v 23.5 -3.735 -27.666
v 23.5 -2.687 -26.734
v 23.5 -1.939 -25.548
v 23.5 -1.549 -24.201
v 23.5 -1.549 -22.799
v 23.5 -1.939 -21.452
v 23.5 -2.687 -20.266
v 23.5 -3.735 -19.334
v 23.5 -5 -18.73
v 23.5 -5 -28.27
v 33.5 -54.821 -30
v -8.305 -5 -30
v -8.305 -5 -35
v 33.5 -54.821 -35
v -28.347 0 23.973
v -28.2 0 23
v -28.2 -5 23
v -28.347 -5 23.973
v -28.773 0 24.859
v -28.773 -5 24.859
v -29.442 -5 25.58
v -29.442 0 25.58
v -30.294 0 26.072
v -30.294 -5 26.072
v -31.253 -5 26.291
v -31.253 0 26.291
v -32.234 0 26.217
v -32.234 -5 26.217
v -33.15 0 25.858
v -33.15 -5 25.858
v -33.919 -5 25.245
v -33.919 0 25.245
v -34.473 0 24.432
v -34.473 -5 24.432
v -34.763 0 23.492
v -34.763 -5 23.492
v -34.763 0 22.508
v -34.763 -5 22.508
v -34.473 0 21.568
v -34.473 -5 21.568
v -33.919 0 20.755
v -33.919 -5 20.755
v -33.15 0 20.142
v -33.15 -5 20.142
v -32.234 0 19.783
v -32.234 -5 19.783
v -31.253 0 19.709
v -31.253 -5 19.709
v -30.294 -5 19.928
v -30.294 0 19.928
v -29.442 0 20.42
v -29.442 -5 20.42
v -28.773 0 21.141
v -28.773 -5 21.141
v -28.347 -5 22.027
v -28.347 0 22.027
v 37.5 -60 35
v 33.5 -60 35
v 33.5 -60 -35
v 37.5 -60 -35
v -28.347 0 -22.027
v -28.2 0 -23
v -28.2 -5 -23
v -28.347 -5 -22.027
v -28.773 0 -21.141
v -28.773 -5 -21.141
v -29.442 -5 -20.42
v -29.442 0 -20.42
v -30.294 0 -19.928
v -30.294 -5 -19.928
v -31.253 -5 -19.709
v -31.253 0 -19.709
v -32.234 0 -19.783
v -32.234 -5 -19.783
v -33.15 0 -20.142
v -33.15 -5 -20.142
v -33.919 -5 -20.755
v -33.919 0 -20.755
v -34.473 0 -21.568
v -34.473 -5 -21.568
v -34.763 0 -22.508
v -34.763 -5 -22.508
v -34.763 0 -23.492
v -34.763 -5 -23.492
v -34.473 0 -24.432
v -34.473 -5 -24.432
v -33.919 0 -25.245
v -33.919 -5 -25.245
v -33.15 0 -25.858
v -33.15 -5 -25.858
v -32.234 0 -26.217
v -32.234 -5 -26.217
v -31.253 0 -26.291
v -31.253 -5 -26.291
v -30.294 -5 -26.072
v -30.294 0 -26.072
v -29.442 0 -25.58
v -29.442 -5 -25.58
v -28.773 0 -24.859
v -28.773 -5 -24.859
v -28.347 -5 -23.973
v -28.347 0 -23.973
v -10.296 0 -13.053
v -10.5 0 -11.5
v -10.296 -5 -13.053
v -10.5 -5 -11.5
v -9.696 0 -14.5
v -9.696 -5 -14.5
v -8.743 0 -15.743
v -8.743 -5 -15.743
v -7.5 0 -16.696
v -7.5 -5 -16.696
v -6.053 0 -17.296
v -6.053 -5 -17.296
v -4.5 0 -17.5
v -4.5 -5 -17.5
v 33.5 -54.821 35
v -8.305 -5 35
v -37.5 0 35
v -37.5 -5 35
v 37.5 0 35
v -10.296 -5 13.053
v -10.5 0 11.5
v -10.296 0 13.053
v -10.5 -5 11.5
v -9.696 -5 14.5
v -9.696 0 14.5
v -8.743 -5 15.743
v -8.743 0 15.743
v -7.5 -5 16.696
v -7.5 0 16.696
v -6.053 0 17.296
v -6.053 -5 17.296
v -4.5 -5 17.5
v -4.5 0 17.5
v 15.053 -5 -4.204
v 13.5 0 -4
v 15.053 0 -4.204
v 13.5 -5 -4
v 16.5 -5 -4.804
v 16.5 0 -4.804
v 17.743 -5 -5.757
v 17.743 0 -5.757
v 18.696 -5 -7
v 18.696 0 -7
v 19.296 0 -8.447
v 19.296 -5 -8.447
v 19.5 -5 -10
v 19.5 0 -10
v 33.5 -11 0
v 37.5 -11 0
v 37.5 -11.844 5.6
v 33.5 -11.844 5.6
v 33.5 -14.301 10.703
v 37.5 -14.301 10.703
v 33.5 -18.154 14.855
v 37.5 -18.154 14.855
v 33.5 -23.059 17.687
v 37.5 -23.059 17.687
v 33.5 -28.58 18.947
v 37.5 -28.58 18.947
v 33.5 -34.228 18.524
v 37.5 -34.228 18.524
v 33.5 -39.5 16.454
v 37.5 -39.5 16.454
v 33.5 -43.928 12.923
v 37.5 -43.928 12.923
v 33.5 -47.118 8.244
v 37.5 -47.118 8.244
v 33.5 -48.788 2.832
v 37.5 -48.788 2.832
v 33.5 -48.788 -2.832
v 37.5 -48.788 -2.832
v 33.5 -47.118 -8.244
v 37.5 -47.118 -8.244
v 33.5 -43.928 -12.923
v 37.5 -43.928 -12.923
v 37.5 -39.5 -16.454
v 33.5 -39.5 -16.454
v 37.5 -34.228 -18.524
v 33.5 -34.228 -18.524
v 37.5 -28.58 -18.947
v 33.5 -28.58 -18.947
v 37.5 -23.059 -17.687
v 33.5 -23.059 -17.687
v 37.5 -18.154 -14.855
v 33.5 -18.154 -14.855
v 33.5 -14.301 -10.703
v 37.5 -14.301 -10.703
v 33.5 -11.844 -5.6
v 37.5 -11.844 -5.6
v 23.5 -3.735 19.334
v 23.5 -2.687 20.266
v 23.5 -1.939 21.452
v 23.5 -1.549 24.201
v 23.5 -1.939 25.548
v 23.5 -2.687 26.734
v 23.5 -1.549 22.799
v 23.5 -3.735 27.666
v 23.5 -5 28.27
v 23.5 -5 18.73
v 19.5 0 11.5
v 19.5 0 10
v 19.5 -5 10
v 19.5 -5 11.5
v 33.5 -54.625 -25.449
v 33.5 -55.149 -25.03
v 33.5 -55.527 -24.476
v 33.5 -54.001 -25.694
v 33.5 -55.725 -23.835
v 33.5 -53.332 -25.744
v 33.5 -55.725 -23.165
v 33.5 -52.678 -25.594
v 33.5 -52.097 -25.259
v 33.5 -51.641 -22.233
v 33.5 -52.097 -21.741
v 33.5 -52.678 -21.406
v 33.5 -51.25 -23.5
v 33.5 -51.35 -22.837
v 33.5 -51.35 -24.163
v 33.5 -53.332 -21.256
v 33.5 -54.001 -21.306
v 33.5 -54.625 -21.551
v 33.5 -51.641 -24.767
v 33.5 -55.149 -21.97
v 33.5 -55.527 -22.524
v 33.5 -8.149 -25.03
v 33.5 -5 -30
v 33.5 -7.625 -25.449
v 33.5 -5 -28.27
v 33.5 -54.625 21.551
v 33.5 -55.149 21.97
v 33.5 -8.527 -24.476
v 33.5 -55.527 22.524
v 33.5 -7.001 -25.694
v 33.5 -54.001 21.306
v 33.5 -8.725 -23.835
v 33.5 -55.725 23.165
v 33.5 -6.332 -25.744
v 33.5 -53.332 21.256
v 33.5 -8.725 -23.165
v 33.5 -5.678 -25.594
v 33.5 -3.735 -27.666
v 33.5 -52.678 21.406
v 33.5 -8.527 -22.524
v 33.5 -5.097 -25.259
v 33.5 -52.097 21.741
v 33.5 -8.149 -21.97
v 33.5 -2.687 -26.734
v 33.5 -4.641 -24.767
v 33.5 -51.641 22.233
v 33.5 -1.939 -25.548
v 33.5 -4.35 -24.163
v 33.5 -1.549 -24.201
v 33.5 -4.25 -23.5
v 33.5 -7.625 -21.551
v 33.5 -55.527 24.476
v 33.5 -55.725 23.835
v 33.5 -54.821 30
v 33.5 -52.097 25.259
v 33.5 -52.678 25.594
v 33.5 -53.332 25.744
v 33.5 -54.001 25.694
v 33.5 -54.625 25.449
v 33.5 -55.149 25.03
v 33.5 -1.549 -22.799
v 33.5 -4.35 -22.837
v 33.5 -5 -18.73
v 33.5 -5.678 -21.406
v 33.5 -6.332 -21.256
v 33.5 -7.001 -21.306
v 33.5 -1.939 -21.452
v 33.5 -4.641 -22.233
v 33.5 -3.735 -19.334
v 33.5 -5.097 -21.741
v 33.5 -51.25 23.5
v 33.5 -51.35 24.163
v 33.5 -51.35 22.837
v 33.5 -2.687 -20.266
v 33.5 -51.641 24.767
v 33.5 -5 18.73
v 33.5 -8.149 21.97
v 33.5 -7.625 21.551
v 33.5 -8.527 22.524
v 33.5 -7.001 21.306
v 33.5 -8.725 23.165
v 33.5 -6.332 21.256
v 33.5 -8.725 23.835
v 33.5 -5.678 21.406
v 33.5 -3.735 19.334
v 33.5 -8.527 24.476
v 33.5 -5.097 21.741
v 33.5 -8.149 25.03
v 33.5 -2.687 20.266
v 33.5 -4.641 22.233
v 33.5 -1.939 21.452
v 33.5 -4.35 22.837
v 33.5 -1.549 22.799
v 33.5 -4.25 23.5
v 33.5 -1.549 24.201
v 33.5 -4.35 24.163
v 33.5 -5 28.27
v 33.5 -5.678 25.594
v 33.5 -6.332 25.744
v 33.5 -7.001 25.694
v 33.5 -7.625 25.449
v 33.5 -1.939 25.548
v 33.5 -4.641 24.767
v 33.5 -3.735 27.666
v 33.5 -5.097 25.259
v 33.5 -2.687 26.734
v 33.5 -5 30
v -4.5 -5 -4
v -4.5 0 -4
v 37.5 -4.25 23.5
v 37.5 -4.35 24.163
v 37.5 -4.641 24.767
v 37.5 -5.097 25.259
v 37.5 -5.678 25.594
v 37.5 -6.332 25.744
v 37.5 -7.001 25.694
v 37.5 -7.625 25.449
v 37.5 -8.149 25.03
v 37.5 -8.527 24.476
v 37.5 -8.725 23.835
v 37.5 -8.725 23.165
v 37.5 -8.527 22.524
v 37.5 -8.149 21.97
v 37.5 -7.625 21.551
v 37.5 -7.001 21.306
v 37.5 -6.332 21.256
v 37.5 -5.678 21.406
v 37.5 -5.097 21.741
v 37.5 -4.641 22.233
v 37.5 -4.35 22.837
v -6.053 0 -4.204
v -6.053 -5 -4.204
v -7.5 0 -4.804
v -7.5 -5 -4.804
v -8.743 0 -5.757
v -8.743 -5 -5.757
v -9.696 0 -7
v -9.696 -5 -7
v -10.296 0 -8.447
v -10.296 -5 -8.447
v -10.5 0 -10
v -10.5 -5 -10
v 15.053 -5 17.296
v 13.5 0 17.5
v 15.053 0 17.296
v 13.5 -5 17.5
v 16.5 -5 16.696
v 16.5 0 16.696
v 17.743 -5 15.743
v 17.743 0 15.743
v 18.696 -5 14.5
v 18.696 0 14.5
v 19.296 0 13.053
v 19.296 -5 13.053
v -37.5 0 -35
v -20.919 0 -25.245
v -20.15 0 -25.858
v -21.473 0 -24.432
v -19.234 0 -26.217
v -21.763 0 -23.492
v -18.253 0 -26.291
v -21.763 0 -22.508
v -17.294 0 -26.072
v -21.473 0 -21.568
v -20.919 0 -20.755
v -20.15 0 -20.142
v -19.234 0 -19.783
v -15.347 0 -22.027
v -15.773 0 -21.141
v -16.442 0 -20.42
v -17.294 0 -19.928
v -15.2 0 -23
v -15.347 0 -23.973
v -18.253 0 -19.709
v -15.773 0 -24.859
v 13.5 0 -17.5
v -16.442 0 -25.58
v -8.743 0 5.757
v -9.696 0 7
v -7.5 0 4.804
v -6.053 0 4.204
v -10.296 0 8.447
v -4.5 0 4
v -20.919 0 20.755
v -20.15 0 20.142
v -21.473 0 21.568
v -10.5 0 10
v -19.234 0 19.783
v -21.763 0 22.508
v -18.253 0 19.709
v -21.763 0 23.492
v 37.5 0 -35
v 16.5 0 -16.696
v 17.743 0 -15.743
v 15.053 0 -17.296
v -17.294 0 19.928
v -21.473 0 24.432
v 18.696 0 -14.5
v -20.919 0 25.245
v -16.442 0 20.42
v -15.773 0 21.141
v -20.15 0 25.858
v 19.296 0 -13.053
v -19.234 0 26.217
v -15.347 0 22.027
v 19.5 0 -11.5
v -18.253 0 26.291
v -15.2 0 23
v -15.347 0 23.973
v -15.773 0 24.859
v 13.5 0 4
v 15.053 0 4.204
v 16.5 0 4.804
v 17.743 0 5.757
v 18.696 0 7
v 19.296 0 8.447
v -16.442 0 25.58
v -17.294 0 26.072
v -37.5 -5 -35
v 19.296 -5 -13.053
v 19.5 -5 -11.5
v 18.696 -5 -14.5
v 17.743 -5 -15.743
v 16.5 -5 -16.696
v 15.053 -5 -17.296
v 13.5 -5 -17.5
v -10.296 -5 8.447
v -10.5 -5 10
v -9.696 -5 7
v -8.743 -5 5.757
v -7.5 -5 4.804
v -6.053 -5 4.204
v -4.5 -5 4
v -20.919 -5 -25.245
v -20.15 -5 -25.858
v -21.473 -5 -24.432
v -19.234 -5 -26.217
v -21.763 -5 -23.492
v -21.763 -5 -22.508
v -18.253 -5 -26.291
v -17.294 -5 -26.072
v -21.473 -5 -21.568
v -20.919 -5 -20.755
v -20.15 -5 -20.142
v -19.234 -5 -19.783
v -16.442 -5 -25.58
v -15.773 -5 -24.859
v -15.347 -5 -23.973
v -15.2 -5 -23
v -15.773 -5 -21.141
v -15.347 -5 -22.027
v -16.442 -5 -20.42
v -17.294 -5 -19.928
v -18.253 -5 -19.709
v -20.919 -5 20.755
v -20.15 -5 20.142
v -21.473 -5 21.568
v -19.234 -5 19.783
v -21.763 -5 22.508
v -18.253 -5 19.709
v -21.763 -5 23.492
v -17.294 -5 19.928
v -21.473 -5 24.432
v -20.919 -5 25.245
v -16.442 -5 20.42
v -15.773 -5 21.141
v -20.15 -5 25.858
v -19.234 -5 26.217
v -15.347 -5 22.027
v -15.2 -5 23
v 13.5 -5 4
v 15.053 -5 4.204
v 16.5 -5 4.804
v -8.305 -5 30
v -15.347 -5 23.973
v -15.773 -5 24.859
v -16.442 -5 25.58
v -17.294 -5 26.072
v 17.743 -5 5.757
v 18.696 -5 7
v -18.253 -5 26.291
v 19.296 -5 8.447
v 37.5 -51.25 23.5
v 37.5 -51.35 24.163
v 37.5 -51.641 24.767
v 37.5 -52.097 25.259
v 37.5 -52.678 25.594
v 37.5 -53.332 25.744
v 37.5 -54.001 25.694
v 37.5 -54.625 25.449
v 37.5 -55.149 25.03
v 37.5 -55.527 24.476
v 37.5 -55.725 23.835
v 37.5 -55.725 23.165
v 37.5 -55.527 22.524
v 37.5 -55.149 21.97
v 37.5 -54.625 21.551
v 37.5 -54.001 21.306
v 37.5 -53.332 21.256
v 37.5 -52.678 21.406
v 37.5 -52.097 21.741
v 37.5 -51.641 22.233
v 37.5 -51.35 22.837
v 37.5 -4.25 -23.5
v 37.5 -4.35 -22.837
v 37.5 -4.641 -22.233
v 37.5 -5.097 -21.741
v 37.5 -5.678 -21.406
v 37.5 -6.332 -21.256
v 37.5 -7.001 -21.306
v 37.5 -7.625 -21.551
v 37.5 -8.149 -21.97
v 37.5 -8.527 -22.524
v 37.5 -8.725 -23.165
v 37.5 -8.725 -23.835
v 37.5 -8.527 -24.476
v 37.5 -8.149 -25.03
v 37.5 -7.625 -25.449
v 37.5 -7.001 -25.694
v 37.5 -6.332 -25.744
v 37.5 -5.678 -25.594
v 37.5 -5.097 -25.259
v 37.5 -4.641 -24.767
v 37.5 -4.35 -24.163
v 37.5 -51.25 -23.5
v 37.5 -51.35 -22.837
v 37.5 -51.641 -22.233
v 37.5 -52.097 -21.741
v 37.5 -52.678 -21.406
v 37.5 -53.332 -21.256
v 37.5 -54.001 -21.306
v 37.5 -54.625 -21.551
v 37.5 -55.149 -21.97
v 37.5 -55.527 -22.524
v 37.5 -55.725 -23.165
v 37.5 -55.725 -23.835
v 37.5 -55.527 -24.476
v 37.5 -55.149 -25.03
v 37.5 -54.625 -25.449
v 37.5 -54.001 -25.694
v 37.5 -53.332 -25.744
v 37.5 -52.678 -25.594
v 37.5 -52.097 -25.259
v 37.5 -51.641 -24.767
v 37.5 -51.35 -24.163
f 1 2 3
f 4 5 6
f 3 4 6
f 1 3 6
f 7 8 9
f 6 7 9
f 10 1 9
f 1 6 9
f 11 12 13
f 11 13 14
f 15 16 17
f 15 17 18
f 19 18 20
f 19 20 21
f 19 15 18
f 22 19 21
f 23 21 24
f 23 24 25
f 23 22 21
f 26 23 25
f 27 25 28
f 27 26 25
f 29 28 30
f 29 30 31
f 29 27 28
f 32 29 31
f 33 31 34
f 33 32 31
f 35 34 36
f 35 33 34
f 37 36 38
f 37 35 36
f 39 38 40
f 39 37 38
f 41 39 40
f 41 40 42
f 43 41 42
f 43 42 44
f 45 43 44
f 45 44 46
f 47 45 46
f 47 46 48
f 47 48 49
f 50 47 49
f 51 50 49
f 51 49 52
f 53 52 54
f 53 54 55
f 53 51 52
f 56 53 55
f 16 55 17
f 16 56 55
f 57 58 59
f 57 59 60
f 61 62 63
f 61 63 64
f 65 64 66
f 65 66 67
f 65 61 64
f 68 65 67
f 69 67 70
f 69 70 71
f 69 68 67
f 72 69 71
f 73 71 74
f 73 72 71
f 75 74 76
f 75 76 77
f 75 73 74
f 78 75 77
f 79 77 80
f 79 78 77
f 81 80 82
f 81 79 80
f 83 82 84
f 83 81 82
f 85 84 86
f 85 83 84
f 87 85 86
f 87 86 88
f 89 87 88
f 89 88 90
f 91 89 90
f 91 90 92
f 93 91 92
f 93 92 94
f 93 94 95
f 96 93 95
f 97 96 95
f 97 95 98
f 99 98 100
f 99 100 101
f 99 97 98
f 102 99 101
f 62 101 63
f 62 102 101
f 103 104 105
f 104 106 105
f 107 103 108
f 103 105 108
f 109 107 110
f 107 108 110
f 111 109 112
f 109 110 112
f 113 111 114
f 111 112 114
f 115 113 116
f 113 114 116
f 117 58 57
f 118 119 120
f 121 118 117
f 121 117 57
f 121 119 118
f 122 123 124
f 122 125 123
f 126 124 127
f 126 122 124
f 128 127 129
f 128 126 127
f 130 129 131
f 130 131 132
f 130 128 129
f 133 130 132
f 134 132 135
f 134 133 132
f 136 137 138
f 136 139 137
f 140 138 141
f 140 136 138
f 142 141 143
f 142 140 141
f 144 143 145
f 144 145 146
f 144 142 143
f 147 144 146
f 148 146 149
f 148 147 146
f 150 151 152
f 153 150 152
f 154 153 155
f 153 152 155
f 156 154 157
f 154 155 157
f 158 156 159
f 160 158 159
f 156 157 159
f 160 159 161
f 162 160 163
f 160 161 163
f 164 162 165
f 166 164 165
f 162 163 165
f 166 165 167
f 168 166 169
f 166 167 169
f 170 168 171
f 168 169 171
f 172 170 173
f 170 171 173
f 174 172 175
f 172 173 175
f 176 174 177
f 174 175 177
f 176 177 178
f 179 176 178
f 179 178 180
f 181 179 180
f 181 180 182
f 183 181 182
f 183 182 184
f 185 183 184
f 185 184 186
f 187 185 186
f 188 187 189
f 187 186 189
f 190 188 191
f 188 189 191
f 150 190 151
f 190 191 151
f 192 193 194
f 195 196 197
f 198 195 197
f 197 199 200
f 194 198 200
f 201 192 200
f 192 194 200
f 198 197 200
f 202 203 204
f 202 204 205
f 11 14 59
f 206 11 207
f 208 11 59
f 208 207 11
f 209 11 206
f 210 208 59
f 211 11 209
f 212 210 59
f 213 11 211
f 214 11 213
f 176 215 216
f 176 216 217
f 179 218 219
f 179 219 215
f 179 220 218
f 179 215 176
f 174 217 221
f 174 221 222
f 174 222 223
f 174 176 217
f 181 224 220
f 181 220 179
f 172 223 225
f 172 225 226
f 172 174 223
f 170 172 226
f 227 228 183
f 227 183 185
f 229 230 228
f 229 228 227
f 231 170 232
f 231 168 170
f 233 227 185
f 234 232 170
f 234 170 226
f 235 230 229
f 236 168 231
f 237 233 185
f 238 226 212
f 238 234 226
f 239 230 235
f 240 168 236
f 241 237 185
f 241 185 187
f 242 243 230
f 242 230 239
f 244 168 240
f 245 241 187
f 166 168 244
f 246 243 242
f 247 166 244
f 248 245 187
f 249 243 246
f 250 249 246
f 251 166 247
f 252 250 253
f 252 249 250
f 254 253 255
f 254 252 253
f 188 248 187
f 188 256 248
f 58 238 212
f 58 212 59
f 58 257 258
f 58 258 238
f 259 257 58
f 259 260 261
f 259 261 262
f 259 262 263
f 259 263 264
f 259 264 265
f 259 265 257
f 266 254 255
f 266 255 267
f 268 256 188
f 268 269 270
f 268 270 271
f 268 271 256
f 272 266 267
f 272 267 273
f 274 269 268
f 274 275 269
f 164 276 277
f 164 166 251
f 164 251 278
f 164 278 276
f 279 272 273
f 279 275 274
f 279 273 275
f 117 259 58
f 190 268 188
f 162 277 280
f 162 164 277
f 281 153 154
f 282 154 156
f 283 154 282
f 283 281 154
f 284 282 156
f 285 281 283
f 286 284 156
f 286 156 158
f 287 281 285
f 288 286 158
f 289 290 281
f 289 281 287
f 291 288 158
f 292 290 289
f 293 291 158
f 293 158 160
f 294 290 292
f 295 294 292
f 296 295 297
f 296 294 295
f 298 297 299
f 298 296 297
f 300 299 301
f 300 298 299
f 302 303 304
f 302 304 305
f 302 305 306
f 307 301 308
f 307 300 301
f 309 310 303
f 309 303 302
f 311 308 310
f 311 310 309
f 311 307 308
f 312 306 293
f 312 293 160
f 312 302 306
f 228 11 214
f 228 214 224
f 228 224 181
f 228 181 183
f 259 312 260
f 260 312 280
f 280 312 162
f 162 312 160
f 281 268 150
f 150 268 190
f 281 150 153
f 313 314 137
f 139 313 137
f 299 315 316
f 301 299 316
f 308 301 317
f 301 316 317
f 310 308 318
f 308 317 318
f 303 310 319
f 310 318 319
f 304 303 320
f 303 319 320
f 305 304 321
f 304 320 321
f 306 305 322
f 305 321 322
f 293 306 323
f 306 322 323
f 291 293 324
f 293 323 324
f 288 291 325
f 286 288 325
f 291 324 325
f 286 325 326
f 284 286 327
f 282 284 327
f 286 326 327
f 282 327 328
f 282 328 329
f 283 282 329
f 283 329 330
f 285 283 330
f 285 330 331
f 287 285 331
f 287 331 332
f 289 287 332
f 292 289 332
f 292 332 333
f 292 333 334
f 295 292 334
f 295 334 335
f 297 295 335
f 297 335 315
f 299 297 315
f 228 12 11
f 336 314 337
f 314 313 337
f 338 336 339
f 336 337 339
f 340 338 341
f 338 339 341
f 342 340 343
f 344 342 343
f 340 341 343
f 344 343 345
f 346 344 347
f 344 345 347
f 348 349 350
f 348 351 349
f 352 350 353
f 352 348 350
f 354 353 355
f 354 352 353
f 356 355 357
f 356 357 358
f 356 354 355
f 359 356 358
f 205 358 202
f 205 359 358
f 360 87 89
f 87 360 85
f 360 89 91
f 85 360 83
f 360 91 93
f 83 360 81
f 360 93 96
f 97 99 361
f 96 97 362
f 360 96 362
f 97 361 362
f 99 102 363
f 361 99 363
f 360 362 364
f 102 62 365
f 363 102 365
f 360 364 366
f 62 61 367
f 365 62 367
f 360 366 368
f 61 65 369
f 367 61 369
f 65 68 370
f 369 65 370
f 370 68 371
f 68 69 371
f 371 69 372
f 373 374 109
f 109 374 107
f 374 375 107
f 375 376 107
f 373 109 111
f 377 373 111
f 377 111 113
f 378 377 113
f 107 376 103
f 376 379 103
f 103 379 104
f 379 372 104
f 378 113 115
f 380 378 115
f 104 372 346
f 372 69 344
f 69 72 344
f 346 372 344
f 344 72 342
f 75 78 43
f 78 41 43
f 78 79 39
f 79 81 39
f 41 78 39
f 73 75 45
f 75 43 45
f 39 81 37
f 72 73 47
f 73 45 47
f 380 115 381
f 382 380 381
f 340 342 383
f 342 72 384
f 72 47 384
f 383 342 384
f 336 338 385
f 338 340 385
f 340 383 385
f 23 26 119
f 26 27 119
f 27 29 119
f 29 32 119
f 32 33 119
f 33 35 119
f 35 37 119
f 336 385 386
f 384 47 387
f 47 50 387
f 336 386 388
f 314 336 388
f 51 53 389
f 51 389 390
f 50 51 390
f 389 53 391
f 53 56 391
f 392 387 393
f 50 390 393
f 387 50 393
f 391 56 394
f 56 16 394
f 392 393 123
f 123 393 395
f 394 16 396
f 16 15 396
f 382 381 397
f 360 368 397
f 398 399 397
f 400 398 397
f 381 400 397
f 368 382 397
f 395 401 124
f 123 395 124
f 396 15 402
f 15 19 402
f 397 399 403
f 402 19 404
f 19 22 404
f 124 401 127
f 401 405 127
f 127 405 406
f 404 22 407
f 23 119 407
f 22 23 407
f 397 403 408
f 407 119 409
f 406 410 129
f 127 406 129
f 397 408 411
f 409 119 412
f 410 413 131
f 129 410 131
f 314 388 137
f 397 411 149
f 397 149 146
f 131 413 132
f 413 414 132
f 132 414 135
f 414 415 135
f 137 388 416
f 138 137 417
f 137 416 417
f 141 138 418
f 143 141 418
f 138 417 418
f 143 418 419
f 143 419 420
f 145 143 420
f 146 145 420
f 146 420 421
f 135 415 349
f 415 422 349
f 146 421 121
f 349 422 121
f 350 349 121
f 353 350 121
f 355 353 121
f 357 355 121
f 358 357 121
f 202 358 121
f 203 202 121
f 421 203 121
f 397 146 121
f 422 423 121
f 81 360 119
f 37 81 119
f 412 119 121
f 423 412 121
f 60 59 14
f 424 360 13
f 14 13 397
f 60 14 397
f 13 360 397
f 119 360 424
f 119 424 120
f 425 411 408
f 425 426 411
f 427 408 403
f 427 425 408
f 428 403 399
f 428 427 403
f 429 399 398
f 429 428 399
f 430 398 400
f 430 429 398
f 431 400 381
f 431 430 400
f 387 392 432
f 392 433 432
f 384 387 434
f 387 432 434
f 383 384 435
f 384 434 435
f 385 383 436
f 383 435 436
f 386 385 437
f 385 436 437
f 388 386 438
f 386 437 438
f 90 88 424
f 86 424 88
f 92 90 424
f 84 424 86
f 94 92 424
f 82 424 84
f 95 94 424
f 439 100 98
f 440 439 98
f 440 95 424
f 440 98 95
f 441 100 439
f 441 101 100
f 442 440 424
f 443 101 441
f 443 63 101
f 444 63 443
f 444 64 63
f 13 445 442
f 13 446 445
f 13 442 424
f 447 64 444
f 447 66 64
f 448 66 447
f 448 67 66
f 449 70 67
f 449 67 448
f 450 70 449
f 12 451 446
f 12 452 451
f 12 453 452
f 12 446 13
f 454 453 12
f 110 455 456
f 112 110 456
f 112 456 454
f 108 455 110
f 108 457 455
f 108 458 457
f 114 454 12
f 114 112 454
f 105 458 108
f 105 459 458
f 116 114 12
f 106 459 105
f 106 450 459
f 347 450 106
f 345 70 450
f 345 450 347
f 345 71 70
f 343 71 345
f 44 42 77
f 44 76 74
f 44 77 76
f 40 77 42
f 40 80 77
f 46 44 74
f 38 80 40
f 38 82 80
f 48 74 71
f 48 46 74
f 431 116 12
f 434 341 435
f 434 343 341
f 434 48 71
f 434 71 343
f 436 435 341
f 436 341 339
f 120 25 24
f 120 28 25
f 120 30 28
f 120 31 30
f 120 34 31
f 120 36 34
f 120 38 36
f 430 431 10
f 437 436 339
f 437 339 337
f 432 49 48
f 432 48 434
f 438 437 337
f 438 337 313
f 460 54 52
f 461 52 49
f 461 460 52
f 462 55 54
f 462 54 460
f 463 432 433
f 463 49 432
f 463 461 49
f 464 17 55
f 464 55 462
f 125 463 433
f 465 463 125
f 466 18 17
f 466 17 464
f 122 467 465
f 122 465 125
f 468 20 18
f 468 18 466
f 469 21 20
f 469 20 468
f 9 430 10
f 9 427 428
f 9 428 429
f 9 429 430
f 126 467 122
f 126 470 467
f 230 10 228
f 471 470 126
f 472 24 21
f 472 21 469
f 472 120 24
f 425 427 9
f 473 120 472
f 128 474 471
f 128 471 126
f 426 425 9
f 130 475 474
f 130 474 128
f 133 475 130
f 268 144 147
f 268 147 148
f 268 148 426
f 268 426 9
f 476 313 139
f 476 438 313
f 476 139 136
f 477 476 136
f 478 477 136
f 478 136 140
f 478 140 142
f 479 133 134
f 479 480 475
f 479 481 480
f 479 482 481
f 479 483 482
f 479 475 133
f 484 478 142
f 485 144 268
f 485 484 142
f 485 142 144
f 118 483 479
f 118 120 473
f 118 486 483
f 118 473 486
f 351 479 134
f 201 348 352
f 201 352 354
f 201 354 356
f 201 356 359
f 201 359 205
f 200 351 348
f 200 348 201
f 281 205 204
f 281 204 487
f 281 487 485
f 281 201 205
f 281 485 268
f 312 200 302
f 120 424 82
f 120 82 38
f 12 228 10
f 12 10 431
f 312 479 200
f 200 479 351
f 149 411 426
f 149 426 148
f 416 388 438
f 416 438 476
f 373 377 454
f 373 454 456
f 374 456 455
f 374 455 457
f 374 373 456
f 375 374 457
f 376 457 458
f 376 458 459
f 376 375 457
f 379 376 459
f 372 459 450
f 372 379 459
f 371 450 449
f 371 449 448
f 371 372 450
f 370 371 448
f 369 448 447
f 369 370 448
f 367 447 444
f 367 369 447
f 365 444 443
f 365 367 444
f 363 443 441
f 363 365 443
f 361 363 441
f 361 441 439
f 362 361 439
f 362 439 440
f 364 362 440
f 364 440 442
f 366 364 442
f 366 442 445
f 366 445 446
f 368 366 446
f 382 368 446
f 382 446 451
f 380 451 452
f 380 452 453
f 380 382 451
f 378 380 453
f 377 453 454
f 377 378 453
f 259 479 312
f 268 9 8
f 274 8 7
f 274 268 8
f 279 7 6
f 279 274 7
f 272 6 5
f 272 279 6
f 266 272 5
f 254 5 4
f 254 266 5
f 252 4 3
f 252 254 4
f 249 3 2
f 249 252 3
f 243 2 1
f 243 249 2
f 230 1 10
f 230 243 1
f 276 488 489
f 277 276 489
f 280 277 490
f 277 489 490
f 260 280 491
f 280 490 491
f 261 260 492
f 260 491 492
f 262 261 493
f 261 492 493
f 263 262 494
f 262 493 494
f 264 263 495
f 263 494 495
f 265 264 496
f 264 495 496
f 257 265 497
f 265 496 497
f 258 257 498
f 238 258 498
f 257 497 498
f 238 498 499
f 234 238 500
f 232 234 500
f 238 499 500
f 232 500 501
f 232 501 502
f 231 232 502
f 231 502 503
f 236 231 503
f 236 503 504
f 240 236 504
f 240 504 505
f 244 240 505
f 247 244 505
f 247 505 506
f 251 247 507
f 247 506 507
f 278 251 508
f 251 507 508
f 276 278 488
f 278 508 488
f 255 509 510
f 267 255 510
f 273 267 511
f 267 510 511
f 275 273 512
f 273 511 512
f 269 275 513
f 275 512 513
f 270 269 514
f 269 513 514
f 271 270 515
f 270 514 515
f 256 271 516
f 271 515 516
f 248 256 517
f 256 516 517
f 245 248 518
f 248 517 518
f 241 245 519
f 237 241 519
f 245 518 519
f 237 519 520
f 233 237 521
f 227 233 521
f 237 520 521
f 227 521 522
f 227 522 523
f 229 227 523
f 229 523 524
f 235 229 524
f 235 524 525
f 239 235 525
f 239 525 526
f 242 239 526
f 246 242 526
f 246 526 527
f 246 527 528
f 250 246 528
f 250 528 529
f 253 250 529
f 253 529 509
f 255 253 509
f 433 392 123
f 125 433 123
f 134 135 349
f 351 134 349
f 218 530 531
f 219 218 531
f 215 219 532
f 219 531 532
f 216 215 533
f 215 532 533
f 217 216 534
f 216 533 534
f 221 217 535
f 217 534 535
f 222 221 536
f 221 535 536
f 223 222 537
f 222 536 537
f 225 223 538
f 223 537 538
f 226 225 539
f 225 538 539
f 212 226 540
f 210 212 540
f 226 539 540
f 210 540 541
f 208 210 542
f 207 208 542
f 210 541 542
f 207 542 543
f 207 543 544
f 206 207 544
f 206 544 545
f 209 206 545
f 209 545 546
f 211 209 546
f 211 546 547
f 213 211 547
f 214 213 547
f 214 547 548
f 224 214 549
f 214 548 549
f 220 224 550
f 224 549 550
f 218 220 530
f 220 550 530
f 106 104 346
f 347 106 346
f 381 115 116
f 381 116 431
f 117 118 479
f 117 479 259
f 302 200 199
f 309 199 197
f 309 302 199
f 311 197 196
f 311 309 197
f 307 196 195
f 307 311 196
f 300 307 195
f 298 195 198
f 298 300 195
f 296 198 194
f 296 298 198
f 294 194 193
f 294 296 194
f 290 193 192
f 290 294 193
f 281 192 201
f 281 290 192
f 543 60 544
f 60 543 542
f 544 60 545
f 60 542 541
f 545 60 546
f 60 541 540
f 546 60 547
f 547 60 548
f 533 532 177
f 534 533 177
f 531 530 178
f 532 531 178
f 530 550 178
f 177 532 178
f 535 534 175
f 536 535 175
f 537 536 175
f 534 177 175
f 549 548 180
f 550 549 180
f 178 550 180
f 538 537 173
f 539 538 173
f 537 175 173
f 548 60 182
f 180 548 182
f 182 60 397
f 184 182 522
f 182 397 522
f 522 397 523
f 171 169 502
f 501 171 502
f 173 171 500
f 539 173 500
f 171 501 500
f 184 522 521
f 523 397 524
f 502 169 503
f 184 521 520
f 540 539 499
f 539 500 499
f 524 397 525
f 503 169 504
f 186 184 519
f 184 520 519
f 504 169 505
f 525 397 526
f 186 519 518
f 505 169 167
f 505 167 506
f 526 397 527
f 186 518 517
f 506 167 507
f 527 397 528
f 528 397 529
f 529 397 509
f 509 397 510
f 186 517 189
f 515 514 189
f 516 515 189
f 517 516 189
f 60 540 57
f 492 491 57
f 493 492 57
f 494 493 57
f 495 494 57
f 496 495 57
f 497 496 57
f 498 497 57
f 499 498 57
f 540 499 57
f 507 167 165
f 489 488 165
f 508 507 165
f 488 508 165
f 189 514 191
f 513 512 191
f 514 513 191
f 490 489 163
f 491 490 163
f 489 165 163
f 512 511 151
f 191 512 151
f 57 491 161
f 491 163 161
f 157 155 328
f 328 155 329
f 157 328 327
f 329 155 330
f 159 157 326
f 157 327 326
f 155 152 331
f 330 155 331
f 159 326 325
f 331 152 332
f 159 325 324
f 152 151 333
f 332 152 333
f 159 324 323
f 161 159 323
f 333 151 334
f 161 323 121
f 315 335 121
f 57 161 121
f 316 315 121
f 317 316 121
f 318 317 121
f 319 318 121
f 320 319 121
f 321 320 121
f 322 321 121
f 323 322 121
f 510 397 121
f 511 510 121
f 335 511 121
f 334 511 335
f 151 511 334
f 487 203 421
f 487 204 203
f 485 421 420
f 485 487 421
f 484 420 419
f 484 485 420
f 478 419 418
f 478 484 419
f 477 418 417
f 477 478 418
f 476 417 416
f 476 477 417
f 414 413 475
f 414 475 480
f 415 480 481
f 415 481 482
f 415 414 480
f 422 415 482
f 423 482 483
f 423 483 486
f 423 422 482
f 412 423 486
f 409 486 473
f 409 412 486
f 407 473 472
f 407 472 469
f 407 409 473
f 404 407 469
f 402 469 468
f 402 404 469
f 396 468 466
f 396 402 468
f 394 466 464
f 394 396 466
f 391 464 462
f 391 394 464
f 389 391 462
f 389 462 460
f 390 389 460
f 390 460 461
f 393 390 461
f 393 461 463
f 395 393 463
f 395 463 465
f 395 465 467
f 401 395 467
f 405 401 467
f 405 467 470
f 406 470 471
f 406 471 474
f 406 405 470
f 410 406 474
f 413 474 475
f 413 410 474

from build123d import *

# Parameters (mm, degrees)
F0_W      = 75
F0_H      = 70
F0_R      = 3.3
F0_W_2    = 30
F0_H_2    = 13.5
F1_DEPTH  = 5
F2_W      = 4
F2_H      = 70
F3_DEPTH  = 55
F4_R      = 19
F4_R_2    = 2.25
F5_DEPTH  = 4
F7_W      = 65.0362595889
F7_H      = 5
F9_R      = 5
F10_DEPTH = 10
F11_R     = 6


with BuildPart() as f1:
    # F0 (on Front) → F1 (new body)
    with BuildSketch(Plane.XZ):
        Rectangle(F0_W, F0_H)
        with Locations((-31.5, -23)):
            Circle(F0_R, mode=Mode.SUBTRACT)
        with Locations((-18.5, -23)):
            Circle(F0_R, mode=Mode.SUBTRACT)
        with Locations((4.5, -10.75)):
            Rectangle(F0_W_2, F0_H_2, mode=Mode.SUBTRACT)
        with Locations((-31.5, 23)):
            Circle(F0_R, mode=Mode.SUBTRACT)
        with Locations((-18.5, 23)):
            Circle(F0_R, mode=Mode.SUBTRACT)
        with Locations((4.5, 10.75)):
            Rectangle(F0_W_2, F0_H_2, mode=Mode.SUBTRACT)
    extrude(amount=F1_DEPTH)

    # F2 (on face) → F3 (join)
    with BuildSketch(Plane.XZ.offset(5)):
        with Locations((35.5, 0)):
            Rectangle(F2_W, F2_H)
    extrude(amount=F3_DEPTH)

    # F4 (on face) → F5 (cut, through all)
    with BuildSketch(Plane.YZ.offset(37.5)):
        with Locations((-30, 0)):
            Circle(F4_R)
        with Locations((-53.5, 23.5)):
            Circle(F4_R_2)
        with Locations((-6.5, 23.5)):
            Circle(F4_R_2)
        with Locations((-6.5, -23.5)):
            Circle(F4_R_2)
        with Locations((-53.5, -23.5)):
            Circle(F4_R_2)
    extrude(amount=-F5_DEPTH, mode=Mode.SUBTRACT)

    # F7 (on line) → F8 (join, up to the next surface of F1)
    with BuildSketch(Plane(origin=(-7.3353011104, -6.1550484563, 0), x_dir=(0.6427876097, -0.7660444431, 0), z_dir=(-0.7660444431, -0.6427876097, 0))):
        with Locations((31.01032112, 32.5)):
            Rectangle(F7_W, F7_H)
        with Locations((31.01032112, -32.5)):
            Rectangle(F7_W, F7_H)
    extrude(until=Until.NEXT, dir=(0.7660444431, 0.6427876097, 0))

    # F9 (on face) → F10 (cut)
    with BuildSketch(Plane(origin=(33.5, 0, 0), x_dir=(0, -1, 0), z_dir=(-1, 0, 0))):
        with Locations((6.5, 23.5000000002)):
            Circle(F9_R)
        with Locations((6.5, -23.4999999998)):
            Circle(F9_R)
    extrude(amount=F10_DEPTH, mode=Mode.SUBTRACT)

    # F11
    f11_edges = [f1.edges().sort_by_distance(p)[0] for p in [
        (-10.5, -2.5, 17.5),
        (19.5, -2.5, 17.5),
        (19.5, -2.5, 4),
        (-10.5, -2.5, 4),
        (19.5, -2.5, -4),
        (19.5, -2.5, -17.5),
        (-10.5, -2.5, -17.5),
        (-10.5, -2.5, -4),
    ]]
    fillet(f11_edges, radius=F11_R)


solid = f1.part
